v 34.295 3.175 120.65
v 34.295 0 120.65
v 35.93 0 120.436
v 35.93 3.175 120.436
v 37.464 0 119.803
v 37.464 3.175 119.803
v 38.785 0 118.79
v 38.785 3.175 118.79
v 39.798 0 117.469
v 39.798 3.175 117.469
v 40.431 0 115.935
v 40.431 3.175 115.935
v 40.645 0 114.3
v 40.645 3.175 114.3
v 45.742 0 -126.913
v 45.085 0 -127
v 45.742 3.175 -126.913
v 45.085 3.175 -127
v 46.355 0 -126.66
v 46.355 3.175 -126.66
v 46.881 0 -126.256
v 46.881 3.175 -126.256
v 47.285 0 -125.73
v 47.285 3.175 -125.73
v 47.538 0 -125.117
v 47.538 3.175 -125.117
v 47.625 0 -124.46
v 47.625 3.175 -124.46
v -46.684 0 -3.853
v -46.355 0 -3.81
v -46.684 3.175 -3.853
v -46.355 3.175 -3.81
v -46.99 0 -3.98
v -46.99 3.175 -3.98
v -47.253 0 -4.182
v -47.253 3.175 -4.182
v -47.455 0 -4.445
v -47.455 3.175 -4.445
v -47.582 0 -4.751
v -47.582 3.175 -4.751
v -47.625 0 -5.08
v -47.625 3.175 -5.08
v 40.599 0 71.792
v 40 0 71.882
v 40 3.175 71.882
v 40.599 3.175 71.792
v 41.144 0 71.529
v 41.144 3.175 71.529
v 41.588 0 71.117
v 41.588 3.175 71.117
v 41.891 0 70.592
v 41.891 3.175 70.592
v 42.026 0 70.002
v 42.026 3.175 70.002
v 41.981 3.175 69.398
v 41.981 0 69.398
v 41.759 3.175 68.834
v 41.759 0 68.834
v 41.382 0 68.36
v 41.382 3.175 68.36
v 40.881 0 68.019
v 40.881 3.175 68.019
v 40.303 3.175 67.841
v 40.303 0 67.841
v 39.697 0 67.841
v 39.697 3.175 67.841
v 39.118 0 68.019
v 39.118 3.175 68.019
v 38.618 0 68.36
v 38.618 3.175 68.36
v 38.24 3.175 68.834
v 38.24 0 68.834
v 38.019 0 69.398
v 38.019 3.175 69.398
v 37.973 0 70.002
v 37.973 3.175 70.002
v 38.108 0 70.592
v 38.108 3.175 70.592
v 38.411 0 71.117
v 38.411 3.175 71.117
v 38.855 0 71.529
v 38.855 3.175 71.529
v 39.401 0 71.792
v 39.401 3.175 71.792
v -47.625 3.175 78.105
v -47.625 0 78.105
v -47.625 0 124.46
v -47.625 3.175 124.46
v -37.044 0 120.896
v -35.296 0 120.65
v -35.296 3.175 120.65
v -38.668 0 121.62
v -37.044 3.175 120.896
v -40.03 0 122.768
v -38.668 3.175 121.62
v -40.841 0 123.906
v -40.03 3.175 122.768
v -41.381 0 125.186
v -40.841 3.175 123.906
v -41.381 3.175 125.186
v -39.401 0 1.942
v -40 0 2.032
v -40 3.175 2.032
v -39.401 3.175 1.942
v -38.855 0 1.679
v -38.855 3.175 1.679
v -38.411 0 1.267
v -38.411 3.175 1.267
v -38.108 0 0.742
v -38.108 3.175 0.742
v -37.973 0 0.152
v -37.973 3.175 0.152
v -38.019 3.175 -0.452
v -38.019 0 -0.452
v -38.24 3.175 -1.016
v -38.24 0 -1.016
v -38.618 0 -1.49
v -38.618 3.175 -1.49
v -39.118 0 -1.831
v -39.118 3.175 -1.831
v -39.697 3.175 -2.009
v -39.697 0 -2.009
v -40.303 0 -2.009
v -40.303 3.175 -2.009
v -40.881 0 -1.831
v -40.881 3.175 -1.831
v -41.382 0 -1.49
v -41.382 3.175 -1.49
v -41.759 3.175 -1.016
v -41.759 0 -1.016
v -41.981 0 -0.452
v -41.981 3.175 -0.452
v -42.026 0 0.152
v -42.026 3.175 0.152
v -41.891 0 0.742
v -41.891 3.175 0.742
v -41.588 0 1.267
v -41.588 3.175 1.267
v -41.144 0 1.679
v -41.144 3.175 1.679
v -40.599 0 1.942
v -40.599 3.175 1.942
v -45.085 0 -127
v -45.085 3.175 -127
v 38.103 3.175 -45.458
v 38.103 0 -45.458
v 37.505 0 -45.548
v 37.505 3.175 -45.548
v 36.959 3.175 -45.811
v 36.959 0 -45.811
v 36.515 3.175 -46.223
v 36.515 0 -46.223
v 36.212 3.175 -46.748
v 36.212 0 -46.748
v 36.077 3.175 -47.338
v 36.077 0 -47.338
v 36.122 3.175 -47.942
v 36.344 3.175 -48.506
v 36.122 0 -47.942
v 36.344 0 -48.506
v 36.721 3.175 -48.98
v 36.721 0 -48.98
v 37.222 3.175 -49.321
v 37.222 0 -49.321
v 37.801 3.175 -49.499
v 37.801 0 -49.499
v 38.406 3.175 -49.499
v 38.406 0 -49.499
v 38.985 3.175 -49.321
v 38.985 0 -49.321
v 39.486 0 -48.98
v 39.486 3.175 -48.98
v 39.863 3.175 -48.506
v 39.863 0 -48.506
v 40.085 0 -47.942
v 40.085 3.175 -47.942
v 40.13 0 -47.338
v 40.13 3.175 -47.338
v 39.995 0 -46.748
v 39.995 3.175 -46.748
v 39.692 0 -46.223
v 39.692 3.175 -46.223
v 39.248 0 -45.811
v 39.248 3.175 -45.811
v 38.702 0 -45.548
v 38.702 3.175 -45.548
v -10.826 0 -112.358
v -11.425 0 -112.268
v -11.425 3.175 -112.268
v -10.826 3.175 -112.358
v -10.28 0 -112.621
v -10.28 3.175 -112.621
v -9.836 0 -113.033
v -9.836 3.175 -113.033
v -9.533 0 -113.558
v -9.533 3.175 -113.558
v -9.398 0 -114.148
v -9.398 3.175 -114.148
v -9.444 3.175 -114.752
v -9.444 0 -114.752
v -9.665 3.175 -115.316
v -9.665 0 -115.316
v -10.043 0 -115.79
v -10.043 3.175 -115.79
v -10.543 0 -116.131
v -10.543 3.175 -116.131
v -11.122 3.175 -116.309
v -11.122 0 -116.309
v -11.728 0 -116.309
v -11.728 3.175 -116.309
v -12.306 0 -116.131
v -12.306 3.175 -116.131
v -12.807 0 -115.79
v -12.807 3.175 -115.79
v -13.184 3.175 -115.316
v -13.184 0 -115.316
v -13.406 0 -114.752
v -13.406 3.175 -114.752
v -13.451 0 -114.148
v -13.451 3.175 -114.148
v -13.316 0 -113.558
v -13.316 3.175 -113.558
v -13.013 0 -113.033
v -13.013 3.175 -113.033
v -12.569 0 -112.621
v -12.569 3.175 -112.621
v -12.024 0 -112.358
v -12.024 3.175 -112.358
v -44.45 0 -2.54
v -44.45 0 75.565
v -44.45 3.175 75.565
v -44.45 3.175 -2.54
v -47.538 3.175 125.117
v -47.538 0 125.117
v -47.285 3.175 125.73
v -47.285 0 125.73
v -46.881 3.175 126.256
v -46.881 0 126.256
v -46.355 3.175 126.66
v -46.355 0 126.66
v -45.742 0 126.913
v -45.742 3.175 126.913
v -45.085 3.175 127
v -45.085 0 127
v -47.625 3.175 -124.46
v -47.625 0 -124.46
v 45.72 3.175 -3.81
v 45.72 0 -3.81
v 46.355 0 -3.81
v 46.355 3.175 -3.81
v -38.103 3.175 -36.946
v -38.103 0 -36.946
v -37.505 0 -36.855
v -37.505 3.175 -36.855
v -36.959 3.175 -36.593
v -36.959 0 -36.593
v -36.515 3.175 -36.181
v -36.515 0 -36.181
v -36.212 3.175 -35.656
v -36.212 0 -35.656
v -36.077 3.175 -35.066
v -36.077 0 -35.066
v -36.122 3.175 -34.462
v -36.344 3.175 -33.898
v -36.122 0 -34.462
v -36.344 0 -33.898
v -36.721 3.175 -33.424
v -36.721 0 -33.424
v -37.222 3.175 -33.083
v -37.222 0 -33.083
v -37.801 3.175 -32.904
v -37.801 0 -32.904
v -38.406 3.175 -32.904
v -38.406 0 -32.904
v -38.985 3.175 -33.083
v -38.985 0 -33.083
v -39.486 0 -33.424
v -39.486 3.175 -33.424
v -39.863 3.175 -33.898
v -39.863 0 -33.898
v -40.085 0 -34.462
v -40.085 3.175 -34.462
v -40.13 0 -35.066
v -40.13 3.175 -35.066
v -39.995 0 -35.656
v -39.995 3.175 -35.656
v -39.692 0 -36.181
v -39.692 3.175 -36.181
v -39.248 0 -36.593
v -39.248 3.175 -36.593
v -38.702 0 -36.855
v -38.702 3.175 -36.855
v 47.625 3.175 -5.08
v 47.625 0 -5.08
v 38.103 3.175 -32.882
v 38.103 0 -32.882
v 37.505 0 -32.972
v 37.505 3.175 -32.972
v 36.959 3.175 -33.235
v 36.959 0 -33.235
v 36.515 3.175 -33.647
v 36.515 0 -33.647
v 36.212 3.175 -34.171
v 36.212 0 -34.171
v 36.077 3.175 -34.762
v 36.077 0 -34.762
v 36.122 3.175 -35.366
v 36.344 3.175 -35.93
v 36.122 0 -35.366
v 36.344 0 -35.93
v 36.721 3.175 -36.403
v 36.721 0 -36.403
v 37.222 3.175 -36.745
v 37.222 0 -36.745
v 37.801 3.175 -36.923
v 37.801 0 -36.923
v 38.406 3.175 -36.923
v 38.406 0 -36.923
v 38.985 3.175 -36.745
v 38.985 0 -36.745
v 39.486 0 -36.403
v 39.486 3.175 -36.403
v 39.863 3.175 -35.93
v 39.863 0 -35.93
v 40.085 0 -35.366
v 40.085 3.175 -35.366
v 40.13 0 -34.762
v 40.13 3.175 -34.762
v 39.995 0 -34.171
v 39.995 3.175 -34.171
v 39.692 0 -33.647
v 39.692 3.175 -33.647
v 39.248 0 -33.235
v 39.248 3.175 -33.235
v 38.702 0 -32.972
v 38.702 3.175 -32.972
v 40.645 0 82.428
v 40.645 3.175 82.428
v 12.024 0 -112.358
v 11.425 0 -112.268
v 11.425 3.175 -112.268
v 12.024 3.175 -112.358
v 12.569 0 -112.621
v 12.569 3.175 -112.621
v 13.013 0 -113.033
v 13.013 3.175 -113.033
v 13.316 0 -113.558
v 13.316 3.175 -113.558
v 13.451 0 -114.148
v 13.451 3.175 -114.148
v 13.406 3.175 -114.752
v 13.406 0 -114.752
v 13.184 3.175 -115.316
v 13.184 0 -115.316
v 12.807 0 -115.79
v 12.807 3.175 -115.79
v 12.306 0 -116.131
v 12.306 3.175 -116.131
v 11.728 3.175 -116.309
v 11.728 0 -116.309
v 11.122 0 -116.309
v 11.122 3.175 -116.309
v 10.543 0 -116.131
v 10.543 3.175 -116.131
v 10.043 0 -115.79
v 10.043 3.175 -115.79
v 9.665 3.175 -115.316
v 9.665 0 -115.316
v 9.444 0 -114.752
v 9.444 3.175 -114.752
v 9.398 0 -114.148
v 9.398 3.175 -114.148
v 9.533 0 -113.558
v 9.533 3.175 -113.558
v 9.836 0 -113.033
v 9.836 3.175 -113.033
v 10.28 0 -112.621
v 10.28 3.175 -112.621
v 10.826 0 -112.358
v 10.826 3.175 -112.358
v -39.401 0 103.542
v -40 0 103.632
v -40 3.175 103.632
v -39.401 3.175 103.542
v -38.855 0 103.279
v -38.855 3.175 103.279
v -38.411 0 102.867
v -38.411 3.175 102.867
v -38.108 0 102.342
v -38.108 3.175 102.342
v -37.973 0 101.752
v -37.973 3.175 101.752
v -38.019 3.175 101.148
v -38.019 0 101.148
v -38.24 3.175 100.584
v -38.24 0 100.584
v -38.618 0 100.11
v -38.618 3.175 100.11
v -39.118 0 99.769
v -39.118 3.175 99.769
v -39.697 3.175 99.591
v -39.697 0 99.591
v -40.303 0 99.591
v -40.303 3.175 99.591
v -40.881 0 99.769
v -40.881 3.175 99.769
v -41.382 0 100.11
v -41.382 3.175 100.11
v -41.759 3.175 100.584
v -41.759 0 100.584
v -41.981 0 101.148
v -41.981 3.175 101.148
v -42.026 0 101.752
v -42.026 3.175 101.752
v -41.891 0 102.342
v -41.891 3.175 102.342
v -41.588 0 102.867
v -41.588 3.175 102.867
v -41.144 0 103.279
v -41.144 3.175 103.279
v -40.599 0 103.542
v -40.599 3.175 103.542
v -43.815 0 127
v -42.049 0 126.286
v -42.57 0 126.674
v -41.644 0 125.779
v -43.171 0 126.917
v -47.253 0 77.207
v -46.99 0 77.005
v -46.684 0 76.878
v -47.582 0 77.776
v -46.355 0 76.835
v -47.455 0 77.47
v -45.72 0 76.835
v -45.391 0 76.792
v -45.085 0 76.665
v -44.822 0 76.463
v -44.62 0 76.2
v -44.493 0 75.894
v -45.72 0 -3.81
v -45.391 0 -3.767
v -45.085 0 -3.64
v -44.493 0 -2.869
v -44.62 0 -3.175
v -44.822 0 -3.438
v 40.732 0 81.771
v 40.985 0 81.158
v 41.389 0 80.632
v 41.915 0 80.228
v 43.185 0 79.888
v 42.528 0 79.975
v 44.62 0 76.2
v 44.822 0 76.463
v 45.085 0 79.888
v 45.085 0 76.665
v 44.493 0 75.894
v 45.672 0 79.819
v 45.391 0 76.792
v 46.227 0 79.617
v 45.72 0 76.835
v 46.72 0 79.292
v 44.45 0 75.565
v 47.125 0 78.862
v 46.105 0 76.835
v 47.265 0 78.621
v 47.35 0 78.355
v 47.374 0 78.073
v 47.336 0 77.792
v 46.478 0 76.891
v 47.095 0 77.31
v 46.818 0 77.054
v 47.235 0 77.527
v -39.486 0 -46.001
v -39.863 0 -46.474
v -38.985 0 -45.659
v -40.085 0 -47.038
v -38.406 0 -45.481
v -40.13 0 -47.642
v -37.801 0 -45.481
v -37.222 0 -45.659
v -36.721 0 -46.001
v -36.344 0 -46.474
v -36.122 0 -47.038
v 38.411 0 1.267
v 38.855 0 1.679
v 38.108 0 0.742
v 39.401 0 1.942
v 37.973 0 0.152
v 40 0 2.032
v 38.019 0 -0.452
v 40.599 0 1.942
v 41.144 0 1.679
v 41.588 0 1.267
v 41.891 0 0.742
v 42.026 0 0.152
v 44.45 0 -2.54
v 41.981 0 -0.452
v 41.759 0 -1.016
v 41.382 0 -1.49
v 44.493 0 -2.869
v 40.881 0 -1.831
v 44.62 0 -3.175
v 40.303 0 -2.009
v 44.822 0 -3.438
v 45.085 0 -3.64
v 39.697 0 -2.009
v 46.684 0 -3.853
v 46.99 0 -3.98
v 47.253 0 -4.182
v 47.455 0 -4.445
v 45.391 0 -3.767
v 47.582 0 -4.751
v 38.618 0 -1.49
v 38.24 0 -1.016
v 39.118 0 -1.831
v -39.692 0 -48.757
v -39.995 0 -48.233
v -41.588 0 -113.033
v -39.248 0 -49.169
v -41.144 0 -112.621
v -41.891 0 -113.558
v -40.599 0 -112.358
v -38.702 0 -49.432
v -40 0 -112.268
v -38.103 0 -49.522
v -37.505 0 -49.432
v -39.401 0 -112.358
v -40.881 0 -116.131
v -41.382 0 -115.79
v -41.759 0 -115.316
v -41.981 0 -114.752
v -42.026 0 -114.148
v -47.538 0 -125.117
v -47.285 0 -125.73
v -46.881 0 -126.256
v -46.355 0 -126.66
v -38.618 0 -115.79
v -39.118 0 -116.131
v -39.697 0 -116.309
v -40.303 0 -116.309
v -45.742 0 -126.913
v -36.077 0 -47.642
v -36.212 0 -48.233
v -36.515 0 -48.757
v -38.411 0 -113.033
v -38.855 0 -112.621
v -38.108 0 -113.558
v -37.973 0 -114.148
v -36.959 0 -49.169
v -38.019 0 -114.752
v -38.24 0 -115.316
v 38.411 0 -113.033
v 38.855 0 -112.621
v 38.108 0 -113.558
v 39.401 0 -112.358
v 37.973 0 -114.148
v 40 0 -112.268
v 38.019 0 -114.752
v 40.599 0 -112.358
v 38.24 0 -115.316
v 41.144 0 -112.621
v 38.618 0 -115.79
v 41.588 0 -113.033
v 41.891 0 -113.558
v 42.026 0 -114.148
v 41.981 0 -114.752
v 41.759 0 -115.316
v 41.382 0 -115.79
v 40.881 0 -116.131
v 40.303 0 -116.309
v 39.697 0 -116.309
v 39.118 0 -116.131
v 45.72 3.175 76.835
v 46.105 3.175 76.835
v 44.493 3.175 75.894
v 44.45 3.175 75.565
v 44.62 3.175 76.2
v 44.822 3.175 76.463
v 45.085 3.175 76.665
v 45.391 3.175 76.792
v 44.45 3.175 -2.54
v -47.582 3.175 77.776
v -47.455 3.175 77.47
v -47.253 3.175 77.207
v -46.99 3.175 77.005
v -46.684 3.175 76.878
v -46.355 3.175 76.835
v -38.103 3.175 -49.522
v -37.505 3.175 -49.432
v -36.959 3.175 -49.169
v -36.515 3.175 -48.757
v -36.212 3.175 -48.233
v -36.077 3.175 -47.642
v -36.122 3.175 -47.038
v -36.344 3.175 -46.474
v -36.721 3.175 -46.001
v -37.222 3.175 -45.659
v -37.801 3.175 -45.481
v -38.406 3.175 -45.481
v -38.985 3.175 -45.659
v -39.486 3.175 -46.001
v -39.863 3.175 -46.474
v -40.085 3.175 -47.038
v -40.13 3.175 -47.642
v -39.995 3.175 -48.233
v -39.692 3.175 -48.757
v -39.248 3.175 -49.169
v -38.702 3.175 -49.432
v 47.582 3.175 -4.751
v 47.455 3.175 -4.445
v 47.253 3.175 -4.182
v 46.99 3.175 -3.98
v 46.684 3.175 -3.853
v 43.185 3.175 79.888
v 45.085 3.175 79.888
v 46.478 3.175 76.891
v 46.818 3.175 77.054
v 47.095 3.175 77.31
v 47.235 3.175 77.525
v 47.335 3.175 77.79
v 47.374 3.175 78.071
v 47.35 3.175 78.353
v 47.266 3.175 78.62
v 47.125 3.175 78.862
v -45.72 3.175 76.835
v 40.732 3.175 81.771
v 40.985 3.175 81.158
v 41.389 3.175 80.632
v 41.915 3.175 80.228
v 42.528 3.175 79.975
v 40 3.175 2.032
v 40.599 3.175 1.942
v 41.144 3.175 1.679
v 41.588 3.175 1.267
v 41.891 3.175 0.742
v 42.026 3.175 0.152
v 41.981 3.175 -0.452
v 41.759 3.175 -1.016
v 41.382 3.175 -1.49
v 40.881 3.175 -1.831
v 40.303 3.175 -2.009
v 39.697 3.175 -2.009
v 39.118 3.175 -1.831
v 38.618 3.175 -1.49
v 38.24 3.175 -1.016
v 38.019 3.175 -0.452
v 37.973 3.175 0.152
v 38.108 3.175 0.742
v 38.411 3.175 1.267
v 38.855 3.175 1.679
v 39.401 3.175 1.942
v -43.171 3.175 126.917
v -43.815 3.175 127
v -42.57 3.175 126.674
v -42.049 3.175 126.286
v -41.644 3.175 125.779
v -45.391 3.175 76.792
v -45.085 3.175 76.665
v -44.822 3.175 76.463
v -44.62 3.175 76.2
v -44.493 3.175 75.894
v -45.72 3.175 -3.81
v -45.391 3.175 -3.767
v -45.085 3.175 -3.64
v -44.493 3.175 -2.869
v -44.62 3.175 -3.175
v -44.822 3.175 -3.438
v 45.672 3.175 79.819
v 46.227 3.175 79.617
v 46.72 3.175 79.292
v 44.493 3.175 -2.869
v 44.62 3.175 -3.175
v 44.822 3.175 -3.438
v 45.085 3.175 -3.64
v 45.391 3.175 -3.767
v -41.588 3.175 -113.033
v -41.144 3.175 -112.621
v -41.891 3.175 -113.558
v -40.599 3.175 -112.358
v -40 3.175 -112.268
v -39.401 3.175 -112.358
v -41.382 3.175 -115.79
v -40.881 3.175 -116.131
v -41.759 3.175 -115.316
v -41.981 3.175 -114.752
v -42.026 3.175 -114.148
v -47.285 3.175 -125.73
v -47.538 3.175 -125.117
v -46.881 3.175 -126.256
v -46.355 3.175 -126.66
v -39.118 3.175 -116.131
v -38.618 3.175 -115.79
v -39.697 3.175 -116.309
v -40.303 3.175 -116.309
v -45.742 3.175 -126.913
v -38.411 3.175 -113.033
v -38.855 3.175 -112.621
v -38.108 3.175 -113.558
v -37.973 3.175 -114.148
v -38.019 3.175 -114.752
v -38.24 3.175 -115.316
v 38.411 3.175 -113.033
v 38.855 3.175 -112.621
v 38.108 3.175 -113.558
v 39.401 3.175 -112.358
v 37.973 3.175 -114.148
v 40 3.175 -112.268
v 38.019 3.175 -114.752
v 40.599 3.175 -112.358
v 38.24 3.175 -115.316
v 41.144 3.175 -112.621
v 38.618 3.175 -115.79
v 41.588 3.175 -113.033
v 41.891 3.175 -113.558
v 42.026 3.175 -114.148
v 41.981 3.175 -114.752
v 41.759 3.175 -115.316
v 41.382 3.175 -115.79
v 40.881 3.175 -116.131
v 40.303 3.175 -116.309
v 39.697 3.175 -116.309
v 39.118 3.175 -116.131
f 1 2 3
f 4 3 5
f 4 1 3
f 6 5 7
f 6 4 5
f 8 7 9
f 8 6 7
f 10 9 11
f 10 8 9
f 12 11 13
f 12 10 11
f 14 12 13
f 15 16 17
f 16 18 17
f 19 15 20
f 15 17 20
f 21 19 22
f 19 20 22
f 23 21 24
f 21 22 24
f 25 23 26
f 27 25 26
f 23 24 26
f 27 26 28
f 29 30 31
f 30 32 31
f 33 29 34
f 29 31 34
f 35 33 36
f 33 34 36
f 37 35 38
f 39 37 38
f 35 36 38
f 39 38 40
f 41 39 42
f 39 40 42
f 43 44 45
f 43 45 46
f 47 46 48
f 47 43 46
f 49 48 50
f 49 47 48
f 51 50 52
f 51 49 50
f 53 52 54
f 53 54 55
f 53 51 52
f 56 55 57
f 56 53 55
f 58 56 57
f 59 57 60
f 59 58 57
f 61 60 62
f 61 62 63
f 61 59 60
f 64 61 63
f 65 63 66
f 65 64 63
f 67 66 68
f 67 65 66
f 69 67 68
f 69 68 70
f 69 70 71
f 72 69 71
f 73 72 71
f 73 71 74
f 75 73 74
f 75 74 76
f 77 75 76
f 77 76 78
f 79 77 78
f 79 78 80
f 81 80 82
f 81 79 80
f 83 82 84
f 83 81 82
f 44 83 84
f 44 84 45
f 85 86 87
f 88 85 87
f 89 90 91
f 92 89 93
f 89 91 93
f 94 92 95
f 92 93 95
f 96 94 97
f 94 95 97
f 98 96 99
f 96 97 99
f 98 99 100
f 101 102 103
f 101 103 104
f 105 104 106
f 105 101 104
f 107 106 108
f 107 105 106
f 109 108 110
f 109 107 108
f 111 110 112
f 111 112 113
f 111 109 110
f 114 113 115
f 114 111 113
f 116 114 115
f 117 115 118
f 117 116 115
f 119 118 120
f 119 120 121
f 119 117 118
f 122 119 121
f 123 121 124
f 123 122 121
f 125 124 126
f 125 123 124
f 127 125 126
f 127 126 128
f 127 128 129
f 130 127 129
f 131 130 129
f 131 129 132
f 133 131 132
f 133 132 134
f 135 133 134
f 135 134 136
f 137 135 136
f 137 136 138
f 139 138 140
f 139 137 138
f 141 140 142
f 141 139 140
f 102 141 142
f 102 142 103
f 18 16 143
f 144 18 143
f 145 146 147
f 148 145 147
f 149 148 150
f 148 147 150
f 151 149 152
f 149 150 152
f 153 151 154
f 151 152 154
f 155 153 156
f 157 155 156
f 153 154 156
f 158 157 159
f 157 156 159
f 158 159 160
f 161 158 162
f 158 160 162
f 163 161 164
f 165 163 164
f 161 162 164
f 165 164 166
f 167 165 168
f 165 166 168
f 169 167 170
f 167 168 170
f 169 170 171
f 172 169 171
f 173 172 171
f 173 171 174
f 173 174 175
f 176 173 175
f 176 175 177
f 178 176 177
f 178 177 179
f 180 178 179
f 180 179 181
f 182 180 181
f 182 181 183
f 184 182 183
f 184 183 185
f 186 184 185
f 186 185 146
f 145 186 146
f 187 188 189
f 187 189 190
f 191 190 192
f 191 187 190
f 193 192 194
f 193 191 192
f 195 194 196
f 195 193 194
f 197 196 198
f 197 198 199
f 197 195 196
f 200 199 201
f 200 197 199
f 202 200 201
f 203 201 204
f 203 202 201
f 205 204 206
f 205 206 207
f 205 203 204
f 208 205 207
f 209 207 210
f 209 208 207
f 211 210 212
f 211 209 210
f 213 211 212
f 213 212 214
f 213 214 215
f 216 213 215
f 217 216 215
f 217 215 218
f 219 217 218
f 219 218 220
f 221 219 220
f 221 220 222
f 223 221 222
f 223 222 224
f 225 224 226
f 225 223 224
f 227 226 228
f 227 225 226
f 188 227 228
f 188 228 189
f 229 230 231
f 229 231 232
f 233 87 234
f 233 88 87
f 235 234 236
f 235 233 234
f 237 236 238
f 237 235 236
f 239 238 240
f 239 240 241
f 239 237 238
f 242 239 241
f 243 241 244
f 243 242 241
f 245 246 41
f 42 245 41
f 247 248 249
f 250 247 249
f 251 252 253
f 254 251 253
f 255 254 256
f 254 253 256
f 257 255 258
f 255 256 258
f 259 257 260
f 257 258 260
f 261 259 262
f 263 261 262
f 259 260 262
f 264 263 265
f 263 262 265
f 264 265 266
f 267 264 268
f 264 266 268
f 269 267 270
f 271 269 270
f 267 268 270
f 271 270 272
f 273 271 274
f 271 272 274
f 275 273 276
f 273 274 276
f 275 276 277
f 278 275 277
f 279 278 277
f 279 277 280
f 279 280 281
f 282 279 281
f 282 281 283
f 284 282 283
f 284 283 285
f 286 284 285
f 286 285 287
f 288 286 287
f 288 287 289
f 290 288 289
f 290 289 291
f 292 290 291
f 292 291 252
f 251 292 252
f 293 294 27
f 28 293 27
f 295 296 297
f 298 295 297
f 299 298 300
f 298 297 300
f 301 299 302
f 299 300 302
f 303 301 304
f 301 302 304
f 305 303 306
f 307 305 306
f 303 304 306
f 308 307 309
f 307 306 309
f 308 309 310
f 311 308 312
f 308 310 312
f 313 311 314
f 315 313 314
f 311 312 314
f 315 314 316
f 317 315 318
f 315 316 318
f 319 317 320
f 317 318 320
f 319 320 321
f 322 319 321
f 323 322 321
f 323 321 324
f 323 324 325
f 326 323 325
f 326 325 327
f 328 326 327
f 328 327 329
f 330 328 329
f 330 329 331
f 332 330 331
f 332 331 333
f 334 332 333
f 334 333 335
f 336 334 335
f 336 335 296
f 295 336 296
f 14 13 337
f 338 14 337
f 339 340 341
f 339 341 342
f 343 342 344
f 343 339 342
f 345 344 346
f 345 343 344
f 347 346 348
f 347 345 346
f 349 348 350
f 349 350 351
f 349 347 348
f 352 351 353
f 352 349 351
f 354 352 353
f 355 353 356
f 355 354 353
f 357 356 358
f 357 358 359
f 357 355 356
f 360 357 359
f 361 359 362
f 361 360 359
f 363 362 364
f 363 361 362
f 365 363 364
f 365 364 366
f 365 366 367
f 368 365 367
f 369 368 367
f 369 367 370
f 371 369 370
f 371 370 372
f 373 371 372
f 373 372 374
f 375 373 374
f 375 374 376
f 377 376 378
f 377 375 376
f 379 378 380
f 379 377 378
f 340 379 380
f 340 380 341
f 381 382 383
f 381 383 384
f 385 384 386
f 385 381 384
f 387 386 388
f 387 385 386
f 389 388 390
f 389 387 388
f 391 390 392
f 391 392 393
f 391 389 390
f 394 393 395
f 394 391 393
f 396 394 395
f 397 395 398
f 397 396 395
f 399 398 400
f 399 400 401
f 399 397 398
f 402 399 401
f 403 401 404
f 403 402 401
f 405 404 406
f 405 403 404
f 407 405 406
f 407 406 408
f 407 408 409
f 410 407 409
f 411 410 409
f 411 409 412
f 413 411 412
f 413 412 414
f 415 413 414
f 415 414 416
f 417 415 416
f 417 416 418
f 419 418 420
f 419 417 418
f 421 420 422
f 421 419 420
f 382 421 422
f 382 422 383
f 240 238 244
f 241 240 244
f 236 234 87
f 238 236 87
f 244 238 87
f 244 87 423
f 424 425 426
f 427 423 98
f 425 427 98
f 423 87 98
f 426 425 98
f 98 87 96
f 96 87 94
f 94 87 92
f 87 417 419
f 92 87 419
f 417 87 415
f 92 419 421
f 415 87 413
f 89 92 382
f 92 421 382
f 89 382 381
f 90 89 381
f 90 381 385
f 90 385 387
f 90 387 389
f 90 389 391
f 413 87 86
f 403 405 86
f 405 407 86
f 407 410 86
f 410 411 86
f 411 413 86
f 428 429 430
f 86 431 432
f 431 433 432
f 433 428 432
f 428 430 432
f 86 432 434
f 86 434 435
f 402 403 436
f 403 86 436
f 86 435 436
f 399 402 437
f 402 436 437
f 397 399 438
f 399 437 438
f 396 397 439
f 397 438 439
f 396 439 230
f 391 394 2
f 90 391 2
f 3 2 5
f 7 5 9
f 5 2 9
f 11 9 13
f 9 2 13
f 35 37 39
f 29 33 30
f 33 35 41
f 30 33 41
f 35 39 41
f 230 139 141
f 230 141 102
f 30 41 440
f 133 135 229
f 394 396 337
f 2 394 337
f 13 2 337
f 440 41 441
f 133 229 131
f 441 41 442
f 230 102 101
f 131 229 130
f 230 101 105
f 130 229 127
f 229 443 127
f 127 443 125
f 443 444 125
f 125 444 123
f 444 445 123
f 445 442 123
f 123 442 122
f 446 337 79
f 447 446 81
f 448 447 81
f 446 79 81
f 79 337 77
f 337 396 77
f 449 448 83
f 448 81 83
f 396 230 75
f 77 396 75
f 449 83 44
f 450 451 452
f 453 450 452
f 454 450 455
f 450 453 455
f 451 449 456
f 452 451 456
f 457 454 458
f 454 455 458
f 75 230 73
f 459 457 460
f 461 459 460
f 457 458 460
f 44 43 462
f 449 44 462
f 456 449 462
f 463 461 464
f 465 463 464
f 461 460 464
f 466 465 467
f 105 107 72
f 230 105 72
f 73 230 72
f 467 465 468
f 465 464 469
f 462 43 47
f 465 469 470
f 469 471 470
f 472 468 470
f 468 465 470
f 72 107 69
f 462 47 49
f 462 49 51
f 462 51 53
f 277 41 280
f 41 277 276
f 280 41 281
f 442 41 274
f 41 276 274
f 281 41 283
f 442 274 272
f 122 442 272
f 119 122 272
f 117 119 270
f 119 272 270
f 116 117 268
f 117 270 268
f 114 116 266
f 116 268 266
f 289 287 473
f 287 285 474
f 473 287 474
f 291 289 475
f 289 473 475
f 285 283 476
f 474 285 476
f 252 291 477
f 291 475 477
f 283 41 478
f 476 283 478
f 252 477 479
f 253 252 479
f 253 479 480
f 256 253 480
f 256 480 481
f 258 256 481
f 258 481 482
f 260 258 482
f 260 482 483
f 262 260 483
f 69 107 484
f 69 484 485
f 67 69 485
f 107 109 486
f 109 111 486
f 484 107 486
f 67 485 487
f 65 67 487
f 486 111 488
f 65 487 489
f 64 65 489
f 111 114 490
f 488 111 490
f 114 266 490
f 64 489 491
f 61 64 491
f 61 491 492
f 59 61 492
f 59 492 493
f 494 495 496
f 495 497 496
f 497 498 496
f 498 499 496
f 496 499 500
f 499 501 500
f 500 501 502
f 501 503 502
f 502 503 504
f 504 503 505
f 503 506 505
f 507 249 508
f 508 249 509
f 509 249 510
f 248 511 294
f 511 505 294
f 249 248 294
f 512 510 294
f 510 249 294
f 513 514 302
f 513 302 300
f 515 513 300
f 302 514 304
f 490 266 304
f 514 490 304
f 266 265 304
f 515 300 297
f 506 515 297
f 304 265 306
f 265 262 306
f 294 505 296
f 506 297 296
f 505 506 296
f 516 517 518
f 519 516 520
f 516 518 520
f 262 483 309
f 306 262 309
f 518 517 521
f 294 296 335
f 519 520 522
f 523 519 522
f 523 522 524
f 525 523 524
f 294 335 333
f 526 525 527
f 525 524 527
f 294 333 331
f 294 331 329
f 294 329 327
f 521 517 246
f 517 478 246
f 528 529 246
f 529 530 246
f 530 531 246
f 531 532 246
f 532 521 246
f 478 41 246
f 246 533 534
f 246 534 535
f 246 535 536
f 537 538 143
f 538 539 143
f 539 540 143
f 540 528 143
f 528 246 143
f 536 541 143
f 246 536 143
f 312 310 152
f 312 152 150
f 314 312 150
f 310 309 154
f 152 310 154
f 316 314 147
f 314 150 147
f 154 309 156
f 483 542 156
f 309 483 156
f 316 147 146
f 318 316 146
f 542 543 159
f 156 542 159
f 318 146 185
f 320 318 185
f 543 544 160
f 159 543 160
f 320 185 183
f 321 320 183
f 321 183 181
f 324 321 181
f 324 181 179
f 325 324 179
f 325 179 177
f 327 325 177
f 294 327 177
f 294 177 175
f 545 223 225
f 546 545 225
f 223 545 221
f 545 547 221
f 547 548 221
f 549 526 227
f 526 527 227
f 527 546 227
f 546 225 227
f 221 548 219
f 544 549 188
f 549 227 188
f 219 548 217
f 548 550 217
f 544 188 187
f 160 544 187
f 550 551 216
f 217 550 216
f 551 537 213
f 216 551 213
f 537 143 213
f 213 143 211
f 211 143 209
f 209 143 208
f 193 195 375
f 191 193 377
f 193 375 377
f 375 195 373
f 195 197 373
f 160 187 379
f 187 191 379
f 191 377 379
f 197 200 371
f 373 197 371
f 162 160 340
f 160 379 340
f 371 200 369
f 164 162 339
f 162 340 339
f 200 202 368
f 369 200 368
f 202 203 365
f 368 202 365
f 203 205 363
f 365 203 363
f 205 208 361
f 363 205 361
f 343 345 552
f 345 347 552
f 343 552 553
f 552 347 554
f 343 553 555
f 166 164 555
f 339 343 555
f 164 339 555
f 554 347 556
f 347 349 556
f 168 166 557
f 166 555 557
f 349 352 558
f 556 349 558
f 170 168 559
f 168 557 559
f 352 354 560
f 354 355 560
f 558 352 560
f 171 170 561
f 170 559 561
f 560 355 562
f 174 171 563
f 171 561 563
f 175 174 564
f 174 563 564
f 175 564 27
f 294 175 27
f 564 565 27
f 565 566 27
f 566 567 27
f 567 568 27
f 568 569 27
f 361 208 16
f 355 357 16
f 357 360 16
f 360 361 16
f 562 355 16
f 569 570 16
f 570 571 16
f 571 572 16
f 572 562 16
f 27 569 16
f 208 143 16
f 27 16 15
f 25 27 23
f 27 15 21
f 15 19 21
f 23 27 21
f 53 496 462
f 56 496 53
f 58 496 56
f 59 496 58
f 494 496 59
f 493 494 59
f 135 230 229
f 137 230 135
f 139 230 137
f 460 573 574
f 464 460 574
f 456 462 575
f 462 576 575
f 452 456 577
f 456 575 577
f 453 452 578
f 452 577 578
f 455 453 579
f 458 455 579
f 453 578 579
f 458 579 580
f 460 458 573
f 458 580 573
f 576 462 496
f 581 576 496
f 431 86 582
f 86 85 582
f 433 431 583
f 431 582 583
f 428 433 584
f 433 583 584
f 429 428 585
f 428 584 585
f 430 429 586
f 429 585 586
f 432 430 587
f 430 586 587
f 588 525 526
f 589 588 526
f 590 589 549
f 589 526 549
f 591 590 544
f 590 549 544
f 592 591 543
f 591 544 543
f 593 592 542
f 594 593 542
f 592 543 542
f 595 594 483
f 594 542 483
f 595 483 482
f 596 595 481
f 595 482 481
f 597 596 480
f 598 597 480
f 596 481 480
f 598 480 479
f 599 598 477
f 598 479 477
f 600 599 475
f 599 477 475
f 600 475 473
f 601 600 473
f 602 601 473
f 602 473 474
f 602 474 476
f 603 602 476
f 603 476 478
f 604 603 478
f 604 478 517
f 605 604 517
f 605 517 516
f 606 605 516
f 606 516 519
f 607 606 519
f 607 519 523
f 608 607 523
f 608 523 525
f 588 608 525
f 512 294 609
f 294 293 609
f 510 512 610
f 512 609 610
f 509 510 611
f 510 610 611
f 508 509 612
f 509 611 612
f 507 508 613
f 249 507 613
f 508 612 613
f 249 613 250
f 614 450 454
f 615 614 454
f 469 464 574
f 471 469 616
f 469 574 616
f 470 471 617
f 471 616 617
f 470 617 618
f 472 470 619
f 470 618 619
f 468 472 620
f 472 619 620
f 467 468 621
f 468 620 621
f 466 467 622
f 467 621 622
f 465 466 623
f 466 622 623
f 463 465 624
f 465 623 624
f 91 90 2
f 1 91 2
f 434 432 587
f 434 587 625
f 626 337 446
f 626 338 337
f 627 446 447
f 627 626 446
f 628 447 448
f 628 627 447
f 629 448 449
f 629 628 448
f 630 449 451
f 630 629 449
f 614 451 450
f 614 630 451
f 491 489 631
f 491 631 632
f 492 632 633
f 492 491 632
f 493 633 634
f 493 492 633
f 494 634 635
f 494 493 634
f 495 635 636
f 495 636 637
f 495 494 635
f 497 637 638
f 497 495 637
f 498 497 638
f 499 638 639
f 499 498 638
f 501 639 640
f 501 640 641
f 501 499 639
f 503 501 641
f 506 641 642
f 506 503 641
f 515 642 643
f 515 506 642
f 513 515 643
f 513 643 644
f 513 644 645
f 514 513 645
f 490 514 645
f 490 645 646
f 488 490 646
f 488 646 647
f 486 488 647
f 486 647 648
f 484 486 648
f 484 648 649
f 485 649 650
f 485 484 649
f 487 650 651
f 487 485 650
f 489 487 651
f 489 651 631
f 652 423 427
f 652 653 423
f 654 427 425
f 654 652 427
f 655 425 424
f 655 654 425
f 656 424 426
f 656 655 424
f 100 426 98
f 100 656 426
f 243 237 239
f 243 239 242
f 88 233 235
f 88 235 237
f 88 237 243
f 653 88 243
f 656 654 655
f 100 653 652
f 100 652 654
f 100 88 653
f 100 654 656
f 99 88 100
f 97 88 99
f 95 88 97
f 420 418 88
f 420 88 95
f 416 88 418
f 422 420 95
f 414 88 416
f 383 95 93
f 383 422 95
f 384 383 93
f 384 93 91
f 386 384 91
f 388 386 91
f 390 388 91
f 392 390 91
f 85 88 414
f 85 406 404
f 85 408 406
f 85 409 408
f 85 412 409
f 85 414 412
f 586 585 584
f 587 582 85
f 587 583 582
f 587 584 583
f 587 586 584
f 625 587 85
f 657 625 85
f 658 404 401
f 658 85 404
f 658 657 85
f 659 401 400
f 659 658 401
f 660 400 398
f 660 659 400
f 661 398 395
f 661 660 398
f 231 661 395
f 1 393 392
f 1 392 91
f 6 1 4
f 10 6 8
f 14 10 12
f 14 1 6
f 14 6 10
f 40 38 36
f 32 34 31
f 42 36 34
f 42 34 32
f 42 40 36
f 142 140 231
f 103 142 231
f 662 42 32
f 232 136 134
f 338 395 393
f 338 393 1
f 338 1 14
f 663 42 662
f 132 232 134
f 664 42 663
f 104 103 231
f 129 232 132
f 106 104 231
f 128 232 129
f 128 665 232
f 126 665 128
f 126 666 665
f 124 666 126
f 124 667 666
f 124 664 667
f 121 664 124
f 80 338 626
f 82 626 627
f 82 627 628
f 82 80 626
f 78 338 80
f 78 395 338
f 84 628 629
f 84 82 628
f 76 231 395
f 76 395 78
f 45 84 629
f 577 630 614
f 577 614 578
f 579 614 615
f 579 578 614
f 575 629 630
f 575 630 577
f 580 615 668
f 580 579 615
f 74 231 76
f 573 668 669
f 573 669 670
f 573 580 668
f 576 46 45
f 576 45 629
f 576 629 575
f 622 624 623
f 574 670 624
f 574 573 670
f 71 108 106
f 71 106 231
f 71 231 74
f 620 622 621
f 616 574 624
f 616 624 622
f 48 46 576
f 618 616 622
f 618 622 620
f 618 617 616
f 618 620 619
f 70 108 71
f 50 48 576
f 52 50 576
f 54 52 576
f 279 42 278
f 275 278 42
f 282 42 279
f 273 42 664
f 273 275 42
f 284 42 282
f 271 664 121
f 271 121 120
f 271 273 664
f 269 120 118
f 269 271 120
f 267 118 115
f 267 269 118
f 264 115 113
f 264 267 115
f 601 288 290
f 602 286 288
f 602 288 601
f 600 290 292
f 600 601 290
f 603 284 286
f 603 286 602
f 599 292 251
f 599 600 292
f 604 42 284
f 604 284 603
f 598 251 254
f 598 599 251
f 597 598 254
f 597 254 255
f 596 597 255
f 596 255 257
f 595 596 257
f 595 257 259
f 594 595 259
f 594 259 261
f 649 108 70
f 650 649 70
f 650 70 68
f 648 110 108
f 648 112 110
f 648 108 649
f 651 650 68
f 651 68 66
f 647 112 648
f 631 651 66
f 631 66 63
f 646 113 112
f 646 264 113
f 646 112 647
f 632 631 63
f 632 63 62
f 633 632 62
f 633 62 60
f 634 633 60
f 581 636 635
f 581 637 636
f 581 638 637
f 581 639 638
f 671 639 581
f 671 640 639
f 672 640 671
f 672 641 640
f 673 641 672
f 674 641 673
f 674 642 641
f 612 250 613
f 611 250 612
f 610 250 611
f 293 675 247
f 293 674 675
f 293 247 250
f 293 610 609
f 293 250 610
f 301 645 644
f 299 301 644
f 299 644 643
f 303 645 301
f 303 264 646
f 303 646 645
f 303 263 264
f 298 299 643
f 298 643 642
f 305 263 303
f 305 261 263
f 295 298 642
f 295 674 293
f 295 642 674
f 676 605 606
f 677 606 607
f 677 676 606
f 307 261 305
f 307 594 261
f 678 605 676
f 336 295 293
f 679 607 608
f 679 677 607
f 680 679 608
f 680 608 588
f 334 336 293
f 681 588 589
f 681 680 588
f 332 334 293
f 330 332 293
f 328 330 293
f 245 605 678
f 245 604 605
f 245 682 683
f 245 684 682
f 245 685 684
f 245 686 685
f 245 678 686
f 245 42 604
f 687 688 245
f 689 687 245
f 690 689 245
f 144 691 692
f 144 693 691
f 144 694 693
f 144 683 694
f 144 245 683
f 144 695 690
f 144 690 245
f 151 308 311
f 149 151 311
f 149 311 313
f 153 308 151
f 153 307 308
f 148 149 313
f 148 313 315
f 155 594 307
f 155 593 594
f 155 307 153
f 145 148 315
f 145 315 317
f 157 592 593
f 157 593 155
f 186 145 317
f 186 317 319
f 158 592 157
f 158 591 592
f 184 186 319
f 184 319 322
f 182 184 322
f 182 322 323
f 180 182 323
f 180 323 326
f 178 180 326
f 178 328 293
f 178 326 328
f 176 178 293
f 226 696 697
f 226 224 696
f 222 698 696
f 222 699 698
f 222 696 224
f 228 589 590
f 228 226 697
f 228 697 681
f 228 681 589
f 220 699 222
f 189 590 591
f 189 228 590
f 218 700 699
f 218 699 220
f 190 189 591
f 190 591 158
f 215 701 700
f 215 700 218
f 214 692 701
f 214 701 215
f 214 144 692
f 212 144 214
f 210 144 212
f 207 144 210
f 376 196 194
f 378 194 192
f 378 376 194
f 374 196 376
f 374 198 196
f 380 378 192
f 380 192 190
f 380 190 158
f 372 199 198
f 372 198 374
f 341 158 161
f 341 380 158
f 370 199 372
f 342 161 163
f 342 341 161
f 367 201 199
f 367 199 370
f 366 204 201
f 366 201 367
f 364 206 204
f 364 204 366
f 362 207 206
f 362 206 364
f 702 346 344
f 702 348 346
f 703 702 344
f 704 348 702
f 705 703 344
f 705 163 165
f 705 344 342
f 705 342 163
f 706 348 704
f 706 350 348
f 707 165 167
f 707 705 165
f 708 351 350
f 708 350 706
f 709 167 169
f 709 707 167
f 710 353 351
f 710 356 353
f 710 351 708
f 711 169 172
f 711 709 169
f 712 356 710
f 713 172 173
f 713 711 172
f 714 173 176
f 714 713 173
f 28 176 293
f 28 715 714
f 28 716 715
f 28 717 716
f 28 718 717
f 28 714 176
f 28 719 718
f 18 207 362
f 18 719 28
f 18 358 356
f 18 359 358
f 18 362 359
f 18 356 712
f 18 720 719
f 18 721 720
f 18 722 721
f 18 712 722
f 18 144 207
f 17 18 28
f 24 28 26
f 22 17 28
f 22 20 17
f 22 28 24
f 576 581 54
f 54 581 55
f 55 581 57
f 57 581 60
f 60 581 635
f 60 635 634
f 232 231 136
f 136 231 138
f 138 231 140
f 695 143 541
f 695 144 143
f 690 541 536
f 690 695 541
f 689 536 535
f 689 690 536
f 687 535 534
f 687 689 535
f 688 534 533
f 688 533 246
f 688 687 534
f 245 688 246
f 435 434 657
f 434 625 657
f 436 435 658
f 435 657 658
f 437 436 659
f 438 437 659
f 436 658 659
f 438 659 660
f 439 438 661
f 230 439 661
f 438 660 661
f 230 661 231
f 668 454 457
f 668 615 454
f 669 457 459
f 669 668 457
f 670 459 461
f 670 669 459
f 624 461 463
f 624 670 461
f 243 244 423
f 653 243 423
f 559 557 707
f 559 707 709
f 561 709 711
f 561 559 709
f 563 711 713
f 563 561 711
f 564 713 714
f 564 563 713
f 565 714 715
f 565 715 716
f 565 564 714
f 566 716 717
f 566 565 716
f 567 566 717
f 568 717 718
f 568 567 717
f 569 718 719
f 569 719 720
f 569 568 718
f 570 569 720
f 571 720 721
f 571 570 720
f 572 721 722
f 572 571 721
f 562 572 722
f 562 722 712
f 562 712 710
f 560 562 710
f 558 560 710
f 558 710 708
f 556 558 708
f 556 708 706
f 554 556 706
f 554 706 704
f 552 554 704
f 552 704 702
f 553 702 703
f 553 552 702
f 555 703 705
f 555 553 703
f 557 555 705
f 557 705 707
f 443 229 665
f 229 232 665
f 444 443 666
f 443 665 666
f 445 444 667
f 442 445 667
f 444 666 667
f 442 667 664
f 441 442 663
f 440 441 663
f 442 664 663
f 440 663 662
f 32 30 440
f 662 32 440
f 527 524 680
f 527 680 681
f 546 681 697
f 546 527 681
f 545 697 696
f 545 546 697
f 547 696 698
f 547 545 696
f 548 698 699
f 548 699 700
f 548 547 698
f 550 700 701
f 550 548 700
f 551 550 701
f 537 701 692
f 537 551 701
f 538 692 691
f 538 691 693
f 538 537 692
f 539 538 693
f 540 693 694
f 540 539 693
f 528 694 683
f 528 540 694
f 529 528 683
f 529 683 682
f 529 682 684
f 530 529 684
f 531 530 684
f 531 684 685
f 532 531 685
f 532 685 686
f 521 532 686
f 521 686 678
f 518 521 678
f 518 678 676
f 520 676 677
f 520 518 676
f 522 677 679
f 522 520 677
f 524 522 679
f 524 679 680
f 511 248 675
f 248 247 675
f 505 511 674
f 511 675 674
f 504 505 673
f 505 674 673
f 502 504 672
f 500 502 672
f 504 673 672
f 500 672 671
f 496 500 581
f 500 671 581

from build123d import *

# Parameters (mm, degrees)
SKETCH1_R               = 2.032
BOSS_EXTRUDE1_DEPTH     = 3.175
FILLET1_R               = 2.54
FILLET2_R               = 2.54
FILLET3_R               = 6.35
CUT_EXTRUDE1_DEPTH      = 136.673215063
FILLET4_R               = 6.35
FILLET5_R               = 2.54
SKETCH3_R               = 2.032
CUT_EXTRUDE2_DEPTH      = 136.673215063
CUT_EXTRUDE3_DEPTH      = 136.673215063
CUT_EXTRUDE3_DEPTH_BACK = 136.673215063
SKETCH4_W               = 3.175
SKETCH4_H               = 80.645
FILLET6_R               = 1.27


with BuildPart() as part:
    # Sketch1 → Boss-Extrude1 (new body)
    with BuildSketch(Plane(origin=(0, 0, 0), x_dir=(1, 0, 0), z_dir=(0, 1, 0))):
        Polygon((47.625, 127), (-47.625, 127), (-47.625, -127), (-41.275, -127), (-41.275, -120.65), (41.275, -120.65), (41.275, -127), (47.625, -127), align=None)
        with Locations(Location((-39.999684148, -101.6, 0), (0, 0, 270))):
            Circle(SKETCH1_R, mode=Mode.SUBTRACT)
        with Locations(Location((39.999684148, -69.85, 0), (0, 0, 270))):
            Circle(SKETCH1_R, mode=Mode.SUBTRACT)
        with Locations(Location((-39.999684148, 0, 0), (0, 0, 270))):
            Circle(SKETCH1_R, mode=Mode.SUBTRACT)
        with Locations(Location((-39.999684148, 114.3, 0), (0, 0, 270))):
            Circle(SKETCH1_R, mode=Mode.SUBTRACT)
        with Locations(Location((-11.424684148, 114.3, 0), (0, 0, 270))):
            Circle(SKETCH1_R, mode=Mode.SUBTRACT)
        with Locations(Location((39.999684148, 0, 0), (0, 0, 270))):
            Circle(SKETCH1_R, mode=Mode.SUBTRACT)
        with Locations(Location((11.424684148, 114.3, 0), (0, 0, 270))):
            Circle(SKETCH1_R, mode=Mode.SUBTRACT)
        with Locations(Location((39.999684148, 114.3, 0), (0, 0, 270))):
            Circle(SKETCH1_R, mode=Mode.SUBTRACT)
    extrude(amount=BOSS_EXTRUDE1_DEPTH)

    # Fillet1
    fillet1_edges = [part.edges().sort_by_distance(p)[0] for p in [
        (-47.625, 1.5875, 127),
        (-47.625, 1.5875, -127),
        (47.625, 1.5875, -127),
        (47.625, 1.5875, 127),
    ]]
    fillet(fillet1_edges, radius=FILLET1_R)

    # Fillet2
    fillet2_edges = [part.edges().sort_by_distance(p)[0] for p in [
        (-41.275, 1.5875, 127),
        (41.275, 1.5875, 127),
    ]]
    fillet(fillet2_edges, radius=FILLET2_R)

    # Fillet3
    fillet3_edges = [part.edges().sort_by_distance(p)[0] for p in [
        (41.275, 1.5875, 120.65),
        (-41.275, 1.5875, 120.65),
    ]]
    fillet(fillet3_edges, radius=FILLET3_R)

    # Sketch2 → Cut-Extrude1 (cut, through all)
    with BuildSketch(Plane.XZ):
        with BuildLine():
            Line((40.64508, 123.578690235), (40.64508, 79.88808))
            Line((40.64508, 79.88808), (47.625, 79.88808))
            Line((47.625, 79.88808), (47.625, 124.46))
            ThreePointArc((47.625, 124.46), (46.881051224, 126.256051224), (45.085, 127))
            Line((45.085, 127), (43.815, 127))
            ThreePointArc((43.815, 127), (42.297059666, 126.496530663), (41.380880287, 125.185714286))
            ThreePointArc((41.380880287, 125.185714286), (41.069166069, 124.356476684), (40.64508, 123.578690235))
        make_face()
    extrude(amount=-CUT_EXTRUDE1_DEPTH, mode=Mode.SUBTRACT)

    # Fillet4
    fillet4_edges = [part.edges().sort_by_distance(p)[0] for p in [
        (40.64508, 1.5875, 123.578690235),
    ]]
    fillet(fillet4_edges, radius=FILLET4_R)

    # Fillet5
    fillet5_edges = [part.edges().sort_by_distance(p)[0] for p in [
        (47.625, 1.5875, 79.88808),
        (40.64508, 1.5875, 79.88808),
    ]]
    fillet(fillet5_edges, radius=FILLET5_R)

    # Sketch3 → Cut-Extrude2 (cut, through all)
    with BuildSketch(Plane.XZ):
        with Locations(Location((-38.103460155, -34.913768806, 0), (0, 0, 270))):
            Circle(SKETCH3_R)
        with Locations(Location((-38.103460155, -47.490173279, 0), (0, 0, 270))):
            Circle(SKETCH3_R)
        with Locations(Location((38.103460155, -47.490173279, 0), (0, 0, 90))):
            Circle(SKETCH3_R)
        with Locations(Location((38.103460155, -34.913768806, 0), (0, 0, 90))):
            Circle(SKETCH3_R)
    extrude(amount=-CUT_EXTRUDE2_DEPTH, mode=Mode.SUBTRACT)

    # Sketch4 → Cut-Extrude3 (cut, two sides: drawn at the far end of the back side and taken through both)
    with BuildSketch(Plane(origin=(0, 3.175, 0), x_dir=(1, 0, 0), z_dir=(0, 1, 0)).offset(-CUT_EXTRUDE3_DEPTH_BACK)):
        with Locations((-46.0375, -36.5125)):
            Rectangle(SKETCH4_W, SKETCH4_H)
        with Locations((46.0375, -36.5125)):
            Rectangle(SKETCH4_W, SKETCH4_H)
    extrude(amount=CUT_EXTRUDE3_DEPTH + CUT_EXTRUDE3_DEPTH_BACK, mode=Mode.SUBTRACT)

    # Fillet6
    fillet6_edges = [part.edges().sort_by_distance(p)[0] for p in [
        (-44.45, 1.5875, -3.81),
        (-47.625, 1.5875, -3.81),
        (-47.625, 1.5875, 76.835),
        (-44.45, 1.5875, 76.835),
        (44.45, 1.5875, 76.835),
        (47.625, 1.5875, 76.835),
        (44.45, 1.5875, -3.81),
        (47.625, 1.5875, -3.81),
    ]]
    fillet(fillet6_edges, radius=FILLET6_R)


solid = part.part
